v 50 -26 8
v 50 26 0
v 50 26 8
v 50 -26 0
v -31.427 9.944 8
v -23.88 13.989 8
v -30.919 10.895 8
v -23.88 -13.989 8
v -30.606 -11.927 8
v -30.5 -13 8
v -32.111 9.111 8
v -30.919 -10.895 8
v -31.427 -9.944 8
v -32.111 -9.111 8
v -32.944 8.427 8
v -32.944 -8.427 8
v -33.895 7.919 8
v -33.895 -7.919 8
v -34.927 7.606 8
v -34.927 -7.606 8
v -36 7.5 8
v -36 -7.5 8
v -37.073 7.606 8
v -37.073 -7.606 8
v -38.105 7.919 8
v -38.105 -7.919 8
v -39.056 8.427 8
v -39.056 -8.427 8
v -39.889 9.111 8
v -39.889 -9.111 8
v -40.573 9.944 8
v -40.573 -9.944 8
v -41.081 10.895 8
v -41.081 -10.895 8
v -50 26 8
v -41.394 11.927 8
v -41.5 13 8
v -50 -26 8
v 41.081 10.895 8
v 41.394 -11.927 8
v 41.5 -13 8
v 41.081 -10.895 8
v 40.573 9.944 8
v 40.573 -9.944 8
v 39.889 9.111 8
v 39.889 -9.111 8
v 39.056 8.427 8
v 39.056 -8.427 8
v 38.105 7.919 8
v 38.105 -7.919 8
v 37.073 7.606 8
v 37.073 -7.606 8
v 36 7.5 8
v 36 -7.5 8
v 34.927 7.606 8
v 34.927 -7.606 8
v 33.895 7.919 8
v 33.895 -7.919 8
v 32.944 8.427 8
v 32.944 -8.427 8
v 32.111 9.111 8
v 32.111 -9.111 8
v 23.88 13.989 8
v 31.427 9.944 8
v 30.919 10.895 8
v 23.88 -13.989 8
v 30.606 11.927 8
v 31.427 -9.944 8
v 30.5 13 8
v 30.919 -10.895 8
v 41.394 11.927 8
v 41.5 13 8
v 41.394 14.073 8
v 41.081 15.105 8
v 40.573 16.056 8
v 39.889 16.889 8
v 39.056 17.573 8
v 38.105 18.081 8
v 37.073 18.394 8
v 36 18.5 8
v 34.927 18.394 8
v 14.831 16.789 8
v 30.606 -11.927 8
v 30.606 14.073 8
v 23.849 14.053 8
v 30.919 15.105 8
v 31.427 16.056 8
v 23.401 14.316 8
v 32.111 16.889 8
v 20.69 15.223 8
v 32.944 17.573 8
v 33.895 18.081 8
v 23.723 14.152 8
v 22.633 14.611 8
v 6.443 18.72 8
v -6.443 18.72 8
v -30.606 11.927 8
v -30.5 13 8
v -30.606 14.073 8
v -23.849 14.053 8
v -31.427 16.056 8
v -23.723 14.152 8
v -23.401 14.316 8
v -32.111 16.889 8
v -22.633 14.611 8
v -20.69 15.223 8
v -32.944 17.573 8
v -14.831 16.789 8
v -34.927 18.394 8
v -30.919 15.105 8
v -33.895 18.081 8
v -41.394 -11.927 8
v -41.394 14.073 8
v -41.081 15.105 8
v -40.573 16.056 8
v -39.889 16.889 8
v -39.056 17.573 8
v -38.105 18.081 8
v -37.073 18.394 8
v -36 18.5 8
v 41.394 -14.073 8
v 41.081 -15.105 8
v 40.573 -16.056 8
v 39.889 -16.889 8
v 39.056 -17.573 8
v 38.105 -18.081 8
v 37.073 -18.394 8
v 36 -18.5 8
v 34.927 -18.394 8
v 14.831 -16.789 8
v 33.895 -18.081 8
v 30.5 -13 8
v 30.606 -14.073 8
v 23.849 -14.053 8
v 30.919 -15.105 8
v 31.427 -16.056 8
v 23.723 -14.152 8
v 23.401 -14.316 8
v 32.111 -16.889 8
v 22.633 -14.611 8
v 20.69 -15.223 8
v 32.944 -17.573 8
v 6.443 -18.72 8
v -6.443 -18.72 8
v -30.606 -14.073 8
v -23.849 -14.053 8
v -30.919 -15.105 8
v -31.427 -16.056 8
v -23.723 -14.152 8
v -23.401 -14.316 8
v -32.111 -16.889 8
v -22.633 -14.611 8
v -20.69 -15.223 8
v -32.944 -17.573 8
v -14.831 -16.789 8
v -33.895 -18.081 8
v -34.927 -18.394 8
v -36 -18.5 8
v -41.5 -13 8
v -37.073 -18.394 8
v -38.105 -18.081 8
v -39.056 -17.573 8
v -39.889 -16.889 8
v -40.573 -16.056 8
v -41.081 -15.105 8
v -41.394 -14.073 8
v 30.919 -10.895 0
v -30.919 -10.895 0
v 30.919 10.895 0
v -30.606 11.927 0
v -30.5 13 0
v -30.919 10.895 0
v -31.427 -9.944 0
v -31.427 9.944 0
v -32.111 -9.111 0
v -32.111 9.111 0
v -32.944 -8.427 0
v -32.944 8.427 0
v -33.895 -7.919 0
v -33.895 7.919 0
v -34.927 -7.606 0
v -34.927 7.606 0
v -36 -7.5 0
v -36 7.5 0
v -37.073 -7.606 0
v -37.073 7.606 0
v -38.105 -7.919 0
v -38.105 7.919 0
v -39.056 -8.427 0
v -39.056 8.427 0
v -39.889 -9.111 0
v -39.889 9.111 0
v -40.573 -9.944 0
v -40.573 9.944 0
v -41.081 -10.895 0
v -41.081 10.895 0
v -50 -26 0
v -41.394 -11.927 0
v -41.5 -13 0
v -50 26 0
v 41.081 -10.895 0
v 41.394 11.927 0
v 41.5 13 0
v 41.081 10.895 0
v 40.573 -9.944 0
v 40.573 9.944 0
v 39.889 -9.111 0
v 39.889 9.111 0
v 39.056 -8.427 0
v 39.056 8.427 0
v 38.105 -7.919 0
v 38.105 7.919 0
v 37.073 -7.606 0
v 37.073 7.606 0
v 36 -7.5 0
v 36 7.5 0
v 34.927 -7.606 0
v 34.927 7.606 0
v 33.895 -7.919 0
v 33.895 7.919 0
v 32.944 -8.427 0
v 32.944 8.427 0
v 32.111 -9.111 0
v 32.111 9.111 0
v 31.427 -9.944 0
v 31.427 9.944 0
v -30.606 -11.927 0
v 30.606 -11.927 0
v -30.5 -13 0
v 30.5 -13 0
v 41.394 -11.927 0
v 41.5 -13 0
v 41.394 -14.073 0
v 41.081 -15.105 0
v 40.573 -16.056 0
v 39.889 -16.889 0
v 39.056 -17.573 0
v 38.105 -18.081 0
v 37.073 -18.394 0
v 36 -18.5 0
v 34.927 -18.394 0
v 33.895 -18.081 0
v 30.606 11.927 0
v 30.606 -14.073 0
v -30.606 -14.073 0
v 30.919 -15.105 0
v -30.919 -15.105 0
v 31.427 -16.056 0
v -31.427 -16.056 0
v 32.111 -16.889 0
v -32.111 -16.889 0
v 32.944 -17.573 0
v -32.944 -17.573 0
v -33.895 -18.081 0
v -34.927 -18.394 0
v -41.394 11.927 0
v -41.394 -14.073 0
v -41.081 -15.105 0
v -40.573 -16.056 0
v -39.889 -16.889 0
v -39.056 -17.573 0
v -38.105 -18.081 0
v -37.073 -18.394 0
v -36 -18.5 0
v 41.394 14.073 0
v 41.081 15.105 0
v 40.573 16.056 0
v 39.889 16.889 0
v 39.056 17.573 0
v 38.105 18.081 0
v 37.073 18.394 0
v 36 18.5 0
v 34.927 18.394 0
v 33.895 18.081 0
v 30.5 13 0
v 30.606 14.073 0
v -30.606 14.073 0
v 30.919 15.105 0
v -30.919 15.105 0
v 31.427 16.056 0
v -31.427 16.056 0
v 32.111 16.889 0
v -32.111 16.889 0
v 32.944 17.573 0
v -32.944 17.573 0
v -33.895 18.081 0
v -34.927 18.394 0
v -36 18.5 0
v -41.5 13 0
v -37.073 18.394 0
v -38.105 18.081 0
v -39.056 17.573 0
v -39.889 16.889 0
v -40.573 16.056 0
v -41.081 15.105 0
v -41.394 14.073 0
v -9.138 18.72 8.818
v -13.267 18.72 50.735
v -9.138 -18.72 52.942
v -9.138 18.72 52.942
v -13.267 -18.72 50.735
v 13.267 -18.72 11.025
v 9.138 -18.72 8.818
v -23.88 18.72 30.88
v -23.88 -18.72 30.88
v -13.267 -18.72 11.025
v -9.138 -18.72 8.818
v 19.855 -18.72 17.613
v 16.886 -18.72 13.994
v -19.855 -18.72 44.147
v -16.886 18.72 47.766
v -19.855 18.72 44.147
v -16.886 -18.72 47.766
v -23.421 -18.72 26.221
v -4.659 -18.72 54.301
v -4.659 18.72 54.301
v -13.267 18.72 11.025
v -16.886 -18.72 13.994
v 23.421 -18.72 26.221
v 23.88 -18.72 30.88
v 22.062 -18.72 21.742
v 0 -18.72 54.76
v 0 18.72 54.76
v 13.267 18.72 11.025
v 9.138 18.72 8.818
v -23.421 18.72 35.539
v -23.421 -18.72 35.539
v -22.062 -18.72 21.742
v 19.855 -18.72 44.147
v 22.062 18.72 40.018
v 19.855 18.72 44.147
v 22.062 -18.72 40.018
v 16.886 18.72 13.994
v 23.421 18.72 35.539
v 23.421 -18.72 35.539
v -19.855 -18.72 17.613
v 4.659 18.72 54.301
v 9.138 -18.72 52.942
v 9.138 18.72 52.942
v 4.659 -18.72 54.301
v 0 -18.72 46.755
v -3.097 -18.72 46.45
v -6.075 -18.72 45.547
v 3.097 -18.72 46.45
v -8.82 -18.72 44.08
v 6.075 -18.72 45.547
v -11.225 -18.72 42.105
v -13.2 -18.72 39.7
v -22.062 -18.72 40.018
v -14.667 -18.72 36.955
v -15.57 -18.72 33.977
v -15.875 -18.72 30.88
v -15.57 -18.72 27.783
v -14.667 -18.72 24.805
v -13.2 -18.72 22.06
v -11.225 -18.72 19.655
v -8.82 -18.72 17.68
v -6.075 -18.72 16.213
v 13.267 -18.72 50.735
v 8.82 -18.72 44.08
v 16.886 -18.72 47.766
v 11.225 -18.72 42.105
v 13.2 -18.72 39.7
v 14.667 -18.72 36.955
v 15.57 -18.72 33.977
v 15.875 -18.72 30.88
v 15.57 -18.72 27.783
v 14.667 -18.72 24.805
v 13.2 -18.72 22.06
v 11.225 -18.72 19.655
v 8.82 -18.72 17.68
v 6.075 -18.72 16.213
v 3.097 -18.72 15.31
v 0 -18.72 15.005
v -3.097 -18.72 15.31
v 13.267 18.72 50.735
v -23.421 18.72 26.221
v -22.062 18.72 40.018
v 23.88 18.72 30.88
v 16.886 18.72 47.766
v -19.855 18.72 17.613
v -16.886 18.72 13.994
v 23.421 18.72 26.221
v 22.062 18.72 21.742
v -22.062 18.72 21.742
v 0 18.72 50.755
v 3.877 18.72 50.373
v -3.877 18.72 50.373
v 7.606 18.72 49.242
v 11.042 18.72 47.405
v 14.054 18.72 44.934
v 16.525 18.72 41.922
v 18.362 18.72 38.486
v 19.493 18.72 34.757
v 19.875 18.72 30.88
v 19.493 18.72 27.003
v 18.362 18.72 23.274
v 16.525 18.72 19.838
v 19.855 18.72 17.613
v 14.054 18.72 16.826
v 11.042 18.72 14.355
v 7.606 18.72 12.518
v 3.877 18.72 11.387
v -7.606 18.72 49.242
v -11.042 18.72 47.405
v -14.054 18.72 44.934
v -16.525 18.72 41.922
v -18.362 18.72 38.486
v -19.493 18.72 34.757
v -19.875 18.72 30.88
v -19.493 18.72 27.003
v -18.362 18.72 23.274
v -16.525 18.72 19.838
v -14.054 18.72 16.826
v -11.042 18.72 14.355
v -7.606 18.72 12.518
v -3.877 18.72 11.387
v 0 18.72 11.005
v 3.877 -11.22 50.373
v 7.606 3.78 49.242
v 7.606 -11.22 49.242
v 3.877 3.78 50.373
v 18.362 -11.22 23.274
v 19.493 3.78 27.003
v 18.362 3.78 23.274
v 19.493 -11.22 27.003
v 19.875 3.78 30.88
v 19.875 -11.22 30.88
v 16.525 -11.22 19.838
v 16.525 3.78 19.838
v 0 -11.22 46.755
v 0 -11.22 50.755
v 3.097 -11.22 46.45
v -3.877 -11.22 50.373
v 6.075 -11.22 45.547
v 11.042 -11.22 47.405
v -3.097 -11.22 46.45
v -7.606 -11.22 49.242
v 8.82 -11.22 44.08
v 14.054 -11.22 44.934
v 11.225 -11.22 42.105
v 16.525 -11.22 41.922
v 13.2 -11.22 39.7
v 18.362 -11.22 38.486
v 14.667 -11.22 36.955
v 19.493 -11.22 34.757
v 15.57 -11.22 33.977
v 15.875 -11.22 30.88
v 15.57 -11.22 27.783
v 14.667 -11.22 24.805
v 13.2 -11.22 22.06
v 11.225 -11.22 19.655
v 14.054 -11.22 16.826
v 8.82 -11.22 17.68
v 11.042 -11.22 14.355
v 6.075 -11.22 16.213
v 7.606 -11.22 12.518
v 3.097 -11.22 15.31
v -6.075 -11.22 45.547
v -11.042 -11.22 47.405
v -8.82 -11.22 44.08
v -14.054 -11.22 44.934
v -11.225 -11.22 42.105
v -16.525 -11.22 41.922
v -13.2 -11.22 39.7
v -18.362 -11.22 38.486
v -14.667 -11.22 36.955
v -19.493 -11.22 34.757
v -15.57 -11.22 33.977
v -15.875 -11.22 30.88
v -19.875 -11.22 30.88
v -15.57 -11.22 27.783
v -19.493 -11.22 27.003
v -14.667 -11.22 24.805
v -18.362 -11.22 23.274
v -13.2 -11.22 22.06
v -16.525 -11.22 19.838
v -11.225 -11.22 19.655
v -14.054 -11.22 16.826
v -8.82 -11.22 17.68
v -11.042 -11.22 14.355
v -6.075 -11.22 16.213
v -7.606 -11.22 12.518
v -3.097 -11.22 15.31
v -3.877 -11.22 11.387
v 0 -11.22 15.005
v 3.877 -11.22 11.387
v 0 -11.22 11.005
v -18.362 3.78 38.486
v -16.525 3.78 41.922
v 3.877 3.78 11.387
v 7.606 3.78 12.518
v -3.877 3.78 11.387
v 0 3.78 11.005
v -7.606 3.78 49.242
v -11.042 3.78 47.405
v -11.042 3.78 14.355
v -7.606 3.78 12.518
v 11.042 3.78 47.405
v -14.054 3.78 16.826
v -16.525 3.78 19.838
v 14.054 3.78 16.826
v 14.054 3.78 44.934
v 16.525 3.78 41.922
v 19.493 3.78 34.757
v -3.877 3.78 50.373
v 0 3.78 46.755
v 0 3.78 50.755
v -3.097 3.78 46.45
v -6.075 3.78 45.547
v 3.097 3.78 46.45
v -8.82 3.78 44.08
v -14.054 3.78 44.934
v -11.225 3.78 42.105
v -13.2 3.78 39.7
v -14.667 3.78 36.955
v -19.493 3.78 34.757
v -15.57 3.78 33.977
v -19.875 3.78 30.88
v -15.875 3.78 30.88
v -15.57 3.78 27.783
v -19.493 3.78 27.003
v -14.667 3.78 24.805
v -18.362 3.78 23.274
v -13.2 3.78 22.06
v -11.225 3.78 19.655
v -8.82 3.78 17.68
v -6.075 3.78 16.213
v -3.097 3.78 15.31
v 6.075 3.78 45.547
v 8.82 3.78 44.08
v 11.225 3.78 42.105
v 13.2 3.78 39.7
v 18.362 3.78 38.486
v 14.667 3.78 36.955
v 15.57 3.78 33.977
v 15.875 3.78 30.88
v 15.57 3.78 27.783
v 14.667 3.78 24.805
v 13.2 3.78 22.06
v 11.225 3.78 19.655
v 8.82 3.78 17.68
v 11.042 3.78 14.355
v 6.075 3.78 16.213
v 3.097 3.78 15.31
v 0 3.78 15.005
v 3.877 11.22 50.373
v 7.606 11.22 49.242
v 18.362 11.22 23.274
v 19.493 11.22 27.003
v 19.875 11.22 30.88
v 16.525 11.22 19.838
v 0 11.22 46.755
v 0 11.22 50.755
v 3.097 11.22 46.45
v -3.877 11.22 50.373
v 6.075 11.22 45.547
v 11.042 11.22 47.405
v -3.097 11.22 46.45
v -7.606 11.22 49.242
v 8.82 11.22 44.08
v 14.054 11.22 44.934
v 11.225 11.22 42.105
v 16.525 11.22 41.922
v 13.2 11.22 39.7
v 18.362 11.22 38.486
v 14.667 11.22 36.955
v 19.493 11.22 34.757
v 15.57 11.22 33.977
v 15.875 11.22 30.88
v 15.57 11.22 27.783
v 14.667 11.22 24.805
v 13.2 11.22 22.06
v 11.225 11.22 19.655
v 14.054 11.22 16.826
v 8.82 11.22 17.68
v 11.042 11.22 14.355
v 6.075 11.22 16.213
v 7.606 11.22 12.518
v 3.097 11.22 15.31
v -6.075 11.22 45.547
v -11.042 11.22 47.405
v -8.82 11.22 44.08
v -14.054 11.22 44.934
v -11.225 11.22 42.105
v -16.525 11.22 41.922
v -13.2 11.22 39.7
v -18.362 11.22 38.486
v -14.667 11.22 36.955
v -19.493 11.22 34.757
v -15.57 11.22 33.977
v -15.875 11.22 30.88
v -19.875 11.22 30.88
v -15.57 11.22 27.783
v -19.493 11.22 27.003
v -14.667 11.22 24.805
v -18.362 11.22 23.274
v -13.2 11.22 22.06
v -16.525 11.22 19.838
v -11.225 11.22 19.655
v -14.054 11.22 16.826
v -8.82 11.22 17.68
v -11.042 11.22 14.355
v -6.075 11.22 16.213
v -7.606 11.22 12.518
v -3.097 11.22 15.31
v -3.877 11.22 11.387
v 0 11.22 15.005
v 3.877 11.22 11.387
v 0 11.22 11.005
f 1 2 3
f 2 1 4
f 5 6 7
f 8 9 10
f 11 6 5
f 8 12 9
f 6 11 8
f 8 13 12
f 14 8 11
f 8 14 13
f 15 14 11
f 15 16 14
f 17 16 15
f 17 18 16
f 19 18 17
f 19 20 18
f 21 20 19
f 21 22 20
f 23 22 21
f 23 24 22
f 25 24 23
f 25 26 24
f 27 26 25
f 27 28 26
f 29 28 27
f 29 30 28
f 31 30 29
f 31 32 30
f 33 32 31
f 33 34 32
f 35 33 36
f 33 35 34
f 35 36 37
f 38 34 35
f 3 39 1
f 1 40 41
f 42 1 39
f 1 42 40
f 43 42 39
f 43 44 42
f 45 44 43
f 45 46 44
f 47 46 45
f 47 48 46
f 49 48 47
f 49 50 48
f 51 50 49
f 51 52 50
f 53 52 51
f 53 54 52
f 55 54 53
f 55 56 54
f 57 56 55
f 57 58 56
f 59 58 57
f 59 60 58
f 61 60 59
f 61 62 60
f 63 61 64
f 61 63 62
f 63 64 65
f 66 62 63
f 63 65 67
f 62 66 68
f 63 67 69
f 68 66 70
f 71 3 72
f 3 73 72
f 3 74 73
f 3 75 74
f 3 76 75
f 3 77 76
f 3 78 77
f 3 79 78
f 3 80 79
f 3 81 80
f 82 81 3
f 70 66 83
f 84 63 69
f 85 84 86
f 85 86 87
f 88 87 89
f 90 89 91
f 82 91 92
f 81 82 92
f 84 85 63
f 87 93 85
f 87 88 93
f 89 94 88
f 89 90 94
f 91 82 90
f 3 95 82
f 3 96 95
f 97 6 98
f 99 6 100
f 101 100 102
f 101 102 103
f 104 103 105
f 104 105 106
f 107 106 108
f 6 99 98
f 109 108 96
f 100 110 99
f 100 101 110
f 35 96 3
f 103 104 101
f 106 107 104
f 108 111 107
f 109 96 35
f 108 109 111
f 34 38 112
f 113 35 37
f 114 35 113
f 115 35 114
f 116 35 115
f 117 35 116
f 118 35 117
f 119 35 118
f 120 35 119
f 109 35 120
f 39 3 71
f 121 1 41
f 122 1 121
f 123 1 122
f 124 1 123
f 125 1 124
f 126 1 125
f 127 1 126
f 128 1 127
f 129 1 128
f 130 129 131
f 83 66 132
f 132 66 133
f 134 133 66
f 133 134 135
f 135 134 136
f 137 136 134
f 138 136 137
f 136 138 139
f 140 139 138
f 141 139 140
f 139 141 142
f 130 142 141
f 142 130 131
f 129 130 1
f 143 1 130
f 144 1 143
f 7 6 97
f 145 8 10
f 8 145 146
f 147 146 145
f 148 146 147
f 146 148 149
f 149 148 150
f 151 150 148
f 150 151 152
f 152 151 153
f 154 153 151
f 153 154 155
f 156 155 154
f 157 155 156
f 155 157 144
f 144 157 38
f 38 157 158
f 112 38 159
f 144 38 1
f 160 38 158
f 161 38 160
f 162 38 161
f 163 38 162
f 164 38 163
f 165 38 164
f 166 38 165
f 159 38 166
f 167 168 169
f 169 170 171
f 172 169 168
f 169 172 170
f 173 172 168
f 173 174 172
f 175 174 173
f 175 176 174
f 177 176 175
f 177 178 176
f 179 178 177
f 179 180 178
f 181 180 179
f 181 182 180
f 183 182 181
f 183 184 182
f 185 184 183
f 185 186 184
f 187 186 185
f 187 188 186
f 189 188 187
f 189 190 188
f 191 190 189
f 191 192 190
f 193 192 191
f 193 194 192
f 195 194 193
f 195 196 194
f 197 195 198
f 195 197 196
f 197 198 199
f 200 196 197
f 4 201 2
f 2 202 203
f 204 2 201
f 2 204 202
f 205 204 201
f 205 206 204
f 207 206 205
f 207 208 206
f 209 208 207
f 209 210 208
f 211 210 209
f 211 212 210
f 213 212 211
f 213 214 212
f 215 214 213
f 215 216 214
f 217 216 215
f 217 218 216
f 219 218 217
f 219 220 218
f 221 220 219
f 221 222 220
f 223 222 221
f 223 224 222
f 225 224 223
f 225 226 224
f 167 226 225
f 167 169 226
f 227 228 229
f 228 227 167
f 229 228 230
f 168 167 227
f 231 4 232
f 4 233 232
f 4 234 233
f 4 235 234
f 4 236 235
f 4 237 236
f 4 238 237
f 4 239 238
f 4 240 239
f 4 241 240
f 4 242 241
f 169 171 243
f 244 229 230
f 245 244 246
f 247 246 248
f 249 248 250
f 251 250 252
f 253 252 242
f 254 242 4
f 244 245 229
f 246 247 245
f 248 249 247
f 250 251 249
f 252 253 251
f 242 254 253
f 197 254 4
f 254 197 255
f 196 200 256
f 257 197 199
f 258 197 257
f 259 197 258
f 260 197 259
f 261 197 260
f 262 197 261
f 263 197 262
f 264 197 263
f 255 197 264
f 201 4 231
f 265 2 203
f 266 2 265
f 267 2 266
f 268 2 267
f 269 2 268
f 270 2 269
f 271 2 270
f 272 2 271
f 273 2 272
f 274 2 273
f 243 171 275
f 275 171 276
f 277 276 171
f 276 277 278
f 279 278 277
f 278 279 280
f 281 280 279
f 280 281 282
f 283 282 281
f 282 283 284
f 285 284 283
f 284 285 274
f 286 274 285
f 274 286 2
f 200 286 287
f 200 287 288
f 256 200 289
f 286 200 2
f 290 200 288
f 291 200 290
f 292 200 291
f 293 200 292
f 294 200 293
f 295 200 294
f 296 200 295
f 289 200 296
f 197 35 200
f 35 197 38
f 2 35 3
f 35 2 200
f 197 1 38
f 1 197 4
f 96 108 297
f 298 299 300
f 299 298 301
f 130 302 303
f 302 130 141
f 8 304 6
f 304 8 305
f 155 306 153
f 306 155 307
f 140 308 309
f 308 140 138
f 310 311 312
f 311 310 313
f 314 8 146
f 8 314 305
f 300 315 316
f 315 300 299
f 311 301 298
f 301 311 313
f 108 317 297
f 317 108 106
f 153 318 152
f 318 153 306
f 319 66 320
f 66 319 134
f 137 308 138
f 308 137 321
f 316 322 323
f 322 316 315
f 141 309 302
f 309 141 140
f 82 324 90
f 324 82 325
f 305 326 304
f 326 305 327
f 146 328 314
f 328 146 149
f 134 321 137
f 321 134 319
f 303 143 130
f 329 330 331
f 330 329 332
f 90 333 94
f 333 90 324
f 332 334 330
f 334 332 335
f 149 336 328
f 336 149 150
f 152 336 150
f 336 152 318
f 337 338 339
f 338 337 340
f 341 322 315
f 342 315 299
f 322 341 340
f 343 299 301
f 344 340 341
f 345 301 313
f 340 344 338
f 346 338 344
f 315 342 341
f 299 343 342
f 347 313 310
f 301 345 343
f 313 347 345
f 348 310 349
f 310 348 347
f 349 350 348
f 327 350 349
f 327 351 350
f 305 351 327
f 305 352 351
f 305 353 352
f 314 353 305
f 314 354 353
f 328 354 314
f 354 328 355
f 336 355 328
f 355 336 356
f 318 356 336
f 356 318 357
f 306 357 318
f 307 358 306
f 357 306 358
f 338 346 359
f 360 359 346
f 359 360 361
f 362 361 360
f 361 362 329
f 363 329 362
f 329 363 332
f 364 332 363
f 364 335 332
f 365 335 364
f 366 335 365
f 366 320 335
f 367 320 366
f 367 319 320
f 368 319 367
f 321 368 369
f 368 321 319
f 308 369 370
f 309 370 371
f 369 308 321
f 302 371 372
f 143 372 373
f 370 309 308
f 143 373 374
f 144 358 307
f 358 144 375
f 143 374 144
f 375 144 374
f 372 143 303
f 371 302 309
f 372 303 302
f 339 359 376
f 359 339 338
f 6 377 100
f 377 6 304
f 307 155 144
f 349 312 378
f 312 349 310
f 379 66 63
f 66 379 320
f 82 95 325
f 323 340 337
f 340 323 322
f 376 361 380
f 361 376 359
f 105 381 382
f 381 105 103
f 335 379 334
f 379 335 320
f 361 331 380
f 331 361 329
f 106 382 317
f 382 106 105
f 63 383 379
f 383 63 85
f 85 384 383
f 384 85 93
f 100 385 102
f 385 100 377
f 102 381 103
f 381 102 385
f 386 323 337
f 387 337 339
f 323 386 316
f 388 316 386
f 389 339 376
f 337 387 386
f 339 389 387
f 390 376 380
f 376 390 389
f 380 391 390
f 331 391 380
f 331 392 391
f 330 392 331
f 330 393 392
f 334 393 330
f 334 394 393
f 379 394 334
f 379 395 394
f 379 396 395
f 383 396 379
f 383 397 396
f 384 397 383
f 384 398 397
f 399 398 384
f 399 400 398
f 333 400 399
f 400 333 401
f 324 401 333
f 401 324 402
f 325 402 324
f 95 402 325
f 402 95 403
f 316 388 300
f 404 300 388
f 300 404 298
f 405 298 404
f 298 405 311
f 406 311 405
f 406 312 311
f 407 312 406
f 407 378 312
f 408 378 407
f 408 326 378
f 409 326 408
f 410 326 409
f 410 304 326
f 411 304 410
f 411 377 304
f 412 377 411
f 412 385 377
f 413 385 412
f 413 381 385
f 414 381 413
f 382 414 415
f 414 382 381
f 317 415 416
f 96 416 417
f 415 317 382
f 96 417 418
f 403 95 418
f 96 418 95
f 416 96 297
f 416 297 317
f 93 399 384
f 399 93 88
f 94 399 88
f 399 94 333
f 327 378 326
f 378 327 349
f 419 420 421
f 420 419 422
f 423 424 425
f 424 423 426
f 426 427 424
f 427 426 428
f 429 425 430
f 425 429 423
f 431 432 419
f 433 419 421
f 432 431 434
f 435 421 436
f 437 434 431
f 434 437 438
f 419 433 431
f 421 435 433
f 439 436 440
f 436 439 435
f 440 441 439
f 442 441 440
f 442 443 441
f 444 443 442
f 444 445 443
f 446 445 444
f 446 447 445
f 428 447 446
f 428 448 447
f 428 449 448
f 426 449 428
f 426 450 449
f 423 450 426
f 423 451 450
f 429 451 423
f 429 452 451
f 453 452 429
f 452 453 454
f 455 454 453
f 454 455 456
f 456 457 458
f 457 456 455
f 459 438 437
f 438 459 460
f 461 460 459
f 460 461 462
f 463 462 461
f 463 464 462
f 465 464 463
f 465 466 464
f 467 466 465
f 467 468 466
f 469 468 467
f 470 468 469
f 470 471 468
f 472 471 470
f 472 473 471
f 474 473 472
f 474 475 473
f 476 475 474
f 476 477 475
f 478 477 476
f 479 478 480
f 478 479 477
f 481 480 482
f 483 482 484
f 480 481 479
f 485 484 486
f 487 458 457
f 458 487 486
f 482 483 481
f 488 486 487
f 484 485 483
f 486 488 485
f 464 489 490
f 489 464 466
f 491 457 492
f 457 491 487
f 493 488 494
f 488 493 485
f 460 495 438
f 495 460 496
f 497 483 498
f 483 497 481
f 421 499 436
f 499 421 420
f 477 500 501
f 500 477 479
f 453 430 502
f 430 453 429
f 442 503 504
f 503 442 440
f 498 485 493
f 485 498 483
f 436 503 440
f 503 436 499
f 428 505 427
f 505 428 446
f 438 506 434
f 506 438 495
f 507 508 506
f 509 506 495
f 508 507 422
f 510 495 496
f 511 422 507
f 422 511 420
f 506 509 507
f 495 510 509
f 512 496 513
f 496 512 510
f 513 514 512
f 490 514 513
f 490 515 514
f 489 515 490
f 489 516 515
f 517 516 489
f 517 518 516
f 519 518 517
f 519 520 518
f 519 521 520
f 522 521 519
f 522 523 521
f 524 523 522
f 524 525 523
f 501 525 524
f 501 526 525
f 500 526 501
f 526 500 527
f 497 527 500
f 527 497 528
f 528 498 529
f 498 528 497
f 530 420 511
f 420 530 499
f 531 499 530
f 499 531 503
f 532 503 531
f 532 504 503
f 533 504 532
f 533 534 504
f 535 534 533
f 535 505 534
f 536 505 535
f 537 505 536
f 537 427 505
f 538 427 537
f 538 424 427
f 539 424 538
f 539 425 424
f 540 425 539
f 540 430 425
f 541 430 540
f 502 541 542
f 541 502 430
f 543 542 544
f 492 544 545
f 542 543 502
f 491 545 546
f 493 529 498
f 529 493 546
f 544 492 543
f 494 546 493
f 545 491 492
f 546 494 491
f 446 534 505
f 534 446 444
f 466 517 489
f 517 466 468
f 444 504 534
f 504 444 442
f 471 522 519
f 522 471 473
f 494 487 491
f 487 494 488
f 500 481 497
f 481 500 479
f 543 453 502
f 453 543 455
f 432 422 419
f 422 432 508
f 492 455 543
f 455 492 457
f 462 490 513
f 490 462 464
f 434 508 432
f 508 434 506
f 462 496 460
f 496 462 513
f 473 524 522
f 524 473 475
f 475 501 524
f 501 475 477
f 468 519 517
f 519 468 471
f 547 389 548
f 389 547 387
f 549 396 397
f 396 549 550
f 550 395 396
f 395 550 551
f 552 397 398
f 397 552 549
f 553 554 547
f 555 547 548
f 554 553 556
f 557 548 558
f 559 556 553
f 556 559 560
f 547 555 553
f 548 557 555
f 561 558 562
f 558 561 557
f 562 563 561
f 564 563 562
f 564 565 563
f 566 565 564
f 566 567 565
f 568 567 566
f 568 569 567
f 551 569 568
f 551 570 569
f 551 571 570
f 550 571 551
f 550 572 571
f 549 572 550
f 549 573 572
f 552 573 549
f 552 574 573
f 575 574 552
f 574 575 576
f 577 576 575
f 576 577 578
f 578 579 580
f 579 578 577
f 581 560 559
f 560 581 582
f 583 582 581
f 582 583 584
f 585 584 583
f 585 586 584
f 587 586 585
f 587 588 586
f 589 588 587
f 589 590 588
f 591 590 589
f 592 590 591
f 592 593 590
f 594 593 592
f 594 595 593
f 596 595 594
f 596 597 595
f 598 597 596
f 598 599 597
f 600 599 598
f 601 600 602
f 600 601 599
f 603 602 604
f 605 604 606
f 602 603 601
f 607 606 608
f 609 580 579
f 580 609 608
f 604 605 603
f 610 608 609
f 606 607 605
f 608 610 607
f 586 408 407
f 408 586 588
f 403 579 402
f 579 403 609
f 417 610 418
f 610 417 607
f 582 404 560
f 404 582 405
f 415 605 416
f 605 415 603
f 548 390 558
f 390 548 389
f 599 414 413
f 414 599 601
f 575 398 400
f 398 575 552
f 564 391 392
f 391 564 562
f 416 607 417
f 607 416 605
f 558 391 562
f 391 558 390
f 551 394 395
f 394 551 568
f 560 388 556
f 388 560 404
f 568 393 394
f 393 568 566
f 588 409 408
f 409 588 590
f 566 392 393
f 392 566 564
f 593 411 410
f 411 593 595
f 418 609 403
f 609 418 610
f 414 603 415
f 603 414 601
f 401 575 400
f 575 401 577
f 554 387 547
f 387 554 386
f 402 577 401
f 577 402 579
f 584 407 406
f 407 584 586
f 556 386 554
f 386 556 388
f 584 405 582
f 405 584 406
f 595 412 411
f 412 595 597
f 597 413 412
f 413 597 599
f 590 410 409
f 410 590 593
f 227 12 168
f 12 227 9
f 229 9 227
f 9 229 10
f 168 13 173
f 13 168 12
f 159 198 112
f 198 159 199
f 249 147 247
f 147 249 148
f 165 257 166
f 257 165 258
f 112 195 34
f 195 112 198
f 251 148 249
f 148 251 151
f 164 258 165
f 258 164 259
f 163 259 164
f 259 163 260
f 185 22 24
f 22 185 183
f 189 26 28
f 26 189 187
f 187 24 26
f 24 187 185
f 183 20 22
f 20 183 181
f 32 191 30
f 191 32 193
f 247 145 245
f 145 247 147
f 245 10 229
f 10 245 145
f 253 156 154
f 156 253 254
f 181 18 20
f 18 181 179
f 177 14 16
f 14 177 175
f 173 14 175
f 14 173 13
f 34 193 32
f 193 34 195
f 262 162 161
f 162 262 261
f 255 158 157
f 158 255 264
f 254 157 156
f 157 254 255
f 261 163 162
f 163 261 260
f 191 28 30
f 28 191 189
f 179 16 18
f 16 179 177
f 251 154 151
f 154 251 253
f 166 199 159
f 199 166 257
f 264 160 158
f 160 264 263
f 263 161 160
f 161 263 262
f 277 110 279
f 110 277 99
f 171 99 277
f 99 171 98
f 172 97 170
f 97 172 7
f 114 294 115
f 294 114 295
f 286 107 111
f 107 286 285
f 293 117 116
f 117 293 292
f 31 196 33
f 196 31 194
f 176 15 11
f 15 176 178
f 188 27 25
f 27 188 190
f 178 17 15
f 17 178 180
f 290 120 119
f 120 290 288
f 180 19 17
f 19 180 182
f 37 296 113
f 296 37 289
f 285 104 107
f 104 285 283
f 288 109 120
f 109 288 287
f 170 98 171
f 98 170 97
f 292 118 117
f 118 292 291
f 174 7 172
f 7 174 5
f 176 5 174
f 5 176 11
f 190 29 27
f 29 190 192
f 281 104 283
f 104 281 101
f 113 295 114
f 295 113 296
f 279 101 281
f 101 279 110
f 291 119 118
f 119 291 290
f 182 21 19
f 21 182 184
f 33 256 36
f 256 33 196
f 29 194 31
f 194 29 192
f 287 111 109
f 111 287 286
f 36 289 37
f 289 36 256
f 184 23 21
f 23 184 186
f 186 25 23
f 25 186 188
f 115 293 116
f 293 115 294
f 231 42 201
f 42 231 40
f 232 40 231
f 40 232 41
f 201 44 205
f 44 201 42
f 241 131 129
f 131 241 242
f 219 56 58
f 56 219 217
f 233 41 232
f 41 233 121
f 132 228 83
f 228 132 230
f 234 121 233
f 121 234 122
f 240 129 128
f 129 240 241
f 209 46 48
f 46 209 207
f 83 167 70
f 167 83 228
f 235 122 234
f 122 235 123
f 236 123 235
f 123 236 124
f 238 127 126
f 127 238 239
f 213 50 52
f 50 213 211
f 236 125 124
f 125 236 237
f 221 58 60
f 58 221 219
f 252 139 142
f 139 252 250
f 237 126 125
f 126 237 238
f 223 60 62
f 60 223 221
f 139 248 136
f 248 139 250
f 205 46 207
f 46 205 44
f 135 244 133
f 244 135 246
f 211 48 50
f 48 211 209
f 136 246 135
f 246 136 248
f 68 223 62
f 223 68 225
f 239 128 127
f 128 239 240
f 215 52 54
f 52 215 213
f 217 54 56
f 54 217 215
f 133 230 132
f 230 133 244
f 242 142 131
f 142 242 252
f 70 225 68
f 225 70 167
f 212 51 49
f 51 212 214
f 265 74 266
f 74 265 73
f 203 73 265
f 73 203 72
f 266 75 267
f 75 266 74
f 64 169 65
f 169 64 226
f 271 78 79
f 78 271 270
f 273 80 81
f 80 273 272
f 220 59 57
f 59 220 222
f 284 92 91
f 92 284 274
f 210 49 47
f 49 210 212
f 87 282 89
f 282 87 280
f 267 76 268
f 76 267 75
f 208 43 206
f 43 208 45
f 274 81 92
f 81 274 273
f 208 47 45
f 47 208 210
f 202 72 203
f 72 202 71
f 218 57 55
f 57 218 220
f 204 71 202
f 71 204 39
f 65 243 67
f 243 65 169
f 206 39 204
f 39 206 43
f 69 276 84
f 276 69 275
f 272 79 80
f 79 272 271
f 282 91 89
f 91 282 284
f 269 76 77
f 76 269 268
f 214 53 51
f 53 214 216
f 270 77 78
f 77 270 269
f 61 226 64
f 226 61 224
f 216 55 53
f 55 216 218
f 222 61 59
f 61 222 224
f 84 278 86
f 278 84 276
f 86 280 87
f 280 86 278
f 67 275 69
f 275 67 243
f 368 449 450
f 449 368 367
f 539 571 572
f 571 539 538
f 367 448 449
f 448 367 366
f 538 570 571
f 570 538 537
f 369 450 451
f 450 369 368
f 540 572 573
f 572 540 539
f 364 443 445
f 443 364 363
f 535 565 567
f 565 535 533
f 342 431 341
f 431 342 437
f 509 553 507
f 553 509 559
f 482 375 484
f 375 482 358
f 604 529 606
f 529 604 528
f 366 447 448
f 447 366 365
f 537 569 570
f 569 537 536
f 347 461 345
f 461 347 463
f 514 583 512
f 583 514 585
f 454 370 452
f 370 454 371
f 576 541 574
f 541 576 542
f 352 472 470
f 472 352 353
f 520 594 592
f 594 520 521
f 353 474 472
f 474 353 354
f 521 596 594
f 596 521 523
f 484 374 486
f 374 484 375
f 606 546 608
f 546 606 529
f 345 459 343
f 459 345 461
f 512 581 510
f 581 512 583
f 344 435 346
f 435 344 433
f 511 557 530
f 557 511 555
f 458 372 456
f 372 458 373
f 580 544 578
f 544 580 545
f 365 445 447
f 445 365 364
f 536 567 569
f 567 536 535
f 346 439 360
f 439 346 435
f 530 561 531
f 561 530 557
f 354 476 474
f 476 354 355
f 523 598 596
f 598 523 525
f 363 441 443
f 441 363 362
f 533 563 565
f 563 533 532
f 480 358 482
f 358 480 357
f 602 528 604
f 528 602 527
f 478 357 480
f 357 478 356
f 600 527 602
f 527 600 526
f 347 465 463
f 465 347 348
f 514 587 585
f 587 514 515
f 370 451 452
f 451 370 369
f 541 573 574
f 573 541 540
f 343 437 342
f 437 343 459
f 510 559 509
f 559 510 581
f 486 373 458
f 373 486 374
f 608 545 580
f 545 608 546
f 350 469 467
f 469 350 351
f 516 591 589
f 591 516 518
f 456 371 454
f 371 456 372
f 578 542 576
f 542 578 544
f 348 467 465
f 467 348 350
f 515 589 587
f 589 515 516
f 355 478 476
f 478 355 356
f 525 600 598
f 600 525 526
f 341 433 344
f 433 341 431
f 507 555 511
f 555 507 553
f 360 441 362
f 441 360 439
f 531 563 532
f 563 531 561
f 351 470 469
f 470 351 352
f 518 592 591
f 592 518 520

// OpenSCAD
$fn = 32;

// ----------------------------------------------------------------------
// Bearing block: 100 x 52 mm base, 31.75 mm bore at 30.88 mm
// ----------------------------------------------------------------------

// --- parameters (mm) ---
base_w = 100;             // base width
base_d = 52;              // base depth
base_t = 8;               // base thickness
bore_d = 31.75;           // shaft / bearing bore
house_r = 23.88;          // housing outer radius
house_len = 37.44;        // housing length along the shaft
foot_w = 47.76;           // foot width under the housing
foot_len = 27.44;         // foot length along the shaft
axis_z = 30.88;           // bore axis height above the base
holes_d = 11;             // mounting holes
hole_x = 36;              // mounting hole spacing
seat_d = 10;              // bearing seat depth
seat_wall = 4;            // seat wall thickness

difference() {
  union() {
    /* base plate with its underside on z = 0 */
    translate([0, 0, base_t / 2]) cube([base_w, base_d, base_t], center = true);
    /* hull foot: a straight web blending into the round housing */
    hull() {
      translate([0, 0, base_t - 0.5]) cube([foot_w, foot_len, 1.6], center = true);
      translate([0, 0, axis_z]) rotate([-90, 0, 0]) cylinder(h = house_len, d = 2 * house_r, center = true);
    }
  }
  /* bore through the housing, 2.5 mm clear on both sides */
  translate([0, 0, axis_z]) rotate([-90, 0, 0]) cylinder(h = house_len + 5, d = bore_d, center = true);
  /* bearing seats, recessed into both ends of the housing */
  for (sy = [-1, 1]) {
    translate([0, sy * (house_len / 2 - seat_d + 2.5), axis_z]) rotate([-90, 0, 0]) cylinder(h = seat_d + 5, d = bore_d + 2 * seat_wall);
  }
  /* mounting holes through the base plate */
  for (hx = [-36, 36]) {
    for (hy = [-13, 13]) {
      translate([hx, hy, -2.5]) cylinder(h = base_t + 5, d = holes_d);
    }
  }
}
